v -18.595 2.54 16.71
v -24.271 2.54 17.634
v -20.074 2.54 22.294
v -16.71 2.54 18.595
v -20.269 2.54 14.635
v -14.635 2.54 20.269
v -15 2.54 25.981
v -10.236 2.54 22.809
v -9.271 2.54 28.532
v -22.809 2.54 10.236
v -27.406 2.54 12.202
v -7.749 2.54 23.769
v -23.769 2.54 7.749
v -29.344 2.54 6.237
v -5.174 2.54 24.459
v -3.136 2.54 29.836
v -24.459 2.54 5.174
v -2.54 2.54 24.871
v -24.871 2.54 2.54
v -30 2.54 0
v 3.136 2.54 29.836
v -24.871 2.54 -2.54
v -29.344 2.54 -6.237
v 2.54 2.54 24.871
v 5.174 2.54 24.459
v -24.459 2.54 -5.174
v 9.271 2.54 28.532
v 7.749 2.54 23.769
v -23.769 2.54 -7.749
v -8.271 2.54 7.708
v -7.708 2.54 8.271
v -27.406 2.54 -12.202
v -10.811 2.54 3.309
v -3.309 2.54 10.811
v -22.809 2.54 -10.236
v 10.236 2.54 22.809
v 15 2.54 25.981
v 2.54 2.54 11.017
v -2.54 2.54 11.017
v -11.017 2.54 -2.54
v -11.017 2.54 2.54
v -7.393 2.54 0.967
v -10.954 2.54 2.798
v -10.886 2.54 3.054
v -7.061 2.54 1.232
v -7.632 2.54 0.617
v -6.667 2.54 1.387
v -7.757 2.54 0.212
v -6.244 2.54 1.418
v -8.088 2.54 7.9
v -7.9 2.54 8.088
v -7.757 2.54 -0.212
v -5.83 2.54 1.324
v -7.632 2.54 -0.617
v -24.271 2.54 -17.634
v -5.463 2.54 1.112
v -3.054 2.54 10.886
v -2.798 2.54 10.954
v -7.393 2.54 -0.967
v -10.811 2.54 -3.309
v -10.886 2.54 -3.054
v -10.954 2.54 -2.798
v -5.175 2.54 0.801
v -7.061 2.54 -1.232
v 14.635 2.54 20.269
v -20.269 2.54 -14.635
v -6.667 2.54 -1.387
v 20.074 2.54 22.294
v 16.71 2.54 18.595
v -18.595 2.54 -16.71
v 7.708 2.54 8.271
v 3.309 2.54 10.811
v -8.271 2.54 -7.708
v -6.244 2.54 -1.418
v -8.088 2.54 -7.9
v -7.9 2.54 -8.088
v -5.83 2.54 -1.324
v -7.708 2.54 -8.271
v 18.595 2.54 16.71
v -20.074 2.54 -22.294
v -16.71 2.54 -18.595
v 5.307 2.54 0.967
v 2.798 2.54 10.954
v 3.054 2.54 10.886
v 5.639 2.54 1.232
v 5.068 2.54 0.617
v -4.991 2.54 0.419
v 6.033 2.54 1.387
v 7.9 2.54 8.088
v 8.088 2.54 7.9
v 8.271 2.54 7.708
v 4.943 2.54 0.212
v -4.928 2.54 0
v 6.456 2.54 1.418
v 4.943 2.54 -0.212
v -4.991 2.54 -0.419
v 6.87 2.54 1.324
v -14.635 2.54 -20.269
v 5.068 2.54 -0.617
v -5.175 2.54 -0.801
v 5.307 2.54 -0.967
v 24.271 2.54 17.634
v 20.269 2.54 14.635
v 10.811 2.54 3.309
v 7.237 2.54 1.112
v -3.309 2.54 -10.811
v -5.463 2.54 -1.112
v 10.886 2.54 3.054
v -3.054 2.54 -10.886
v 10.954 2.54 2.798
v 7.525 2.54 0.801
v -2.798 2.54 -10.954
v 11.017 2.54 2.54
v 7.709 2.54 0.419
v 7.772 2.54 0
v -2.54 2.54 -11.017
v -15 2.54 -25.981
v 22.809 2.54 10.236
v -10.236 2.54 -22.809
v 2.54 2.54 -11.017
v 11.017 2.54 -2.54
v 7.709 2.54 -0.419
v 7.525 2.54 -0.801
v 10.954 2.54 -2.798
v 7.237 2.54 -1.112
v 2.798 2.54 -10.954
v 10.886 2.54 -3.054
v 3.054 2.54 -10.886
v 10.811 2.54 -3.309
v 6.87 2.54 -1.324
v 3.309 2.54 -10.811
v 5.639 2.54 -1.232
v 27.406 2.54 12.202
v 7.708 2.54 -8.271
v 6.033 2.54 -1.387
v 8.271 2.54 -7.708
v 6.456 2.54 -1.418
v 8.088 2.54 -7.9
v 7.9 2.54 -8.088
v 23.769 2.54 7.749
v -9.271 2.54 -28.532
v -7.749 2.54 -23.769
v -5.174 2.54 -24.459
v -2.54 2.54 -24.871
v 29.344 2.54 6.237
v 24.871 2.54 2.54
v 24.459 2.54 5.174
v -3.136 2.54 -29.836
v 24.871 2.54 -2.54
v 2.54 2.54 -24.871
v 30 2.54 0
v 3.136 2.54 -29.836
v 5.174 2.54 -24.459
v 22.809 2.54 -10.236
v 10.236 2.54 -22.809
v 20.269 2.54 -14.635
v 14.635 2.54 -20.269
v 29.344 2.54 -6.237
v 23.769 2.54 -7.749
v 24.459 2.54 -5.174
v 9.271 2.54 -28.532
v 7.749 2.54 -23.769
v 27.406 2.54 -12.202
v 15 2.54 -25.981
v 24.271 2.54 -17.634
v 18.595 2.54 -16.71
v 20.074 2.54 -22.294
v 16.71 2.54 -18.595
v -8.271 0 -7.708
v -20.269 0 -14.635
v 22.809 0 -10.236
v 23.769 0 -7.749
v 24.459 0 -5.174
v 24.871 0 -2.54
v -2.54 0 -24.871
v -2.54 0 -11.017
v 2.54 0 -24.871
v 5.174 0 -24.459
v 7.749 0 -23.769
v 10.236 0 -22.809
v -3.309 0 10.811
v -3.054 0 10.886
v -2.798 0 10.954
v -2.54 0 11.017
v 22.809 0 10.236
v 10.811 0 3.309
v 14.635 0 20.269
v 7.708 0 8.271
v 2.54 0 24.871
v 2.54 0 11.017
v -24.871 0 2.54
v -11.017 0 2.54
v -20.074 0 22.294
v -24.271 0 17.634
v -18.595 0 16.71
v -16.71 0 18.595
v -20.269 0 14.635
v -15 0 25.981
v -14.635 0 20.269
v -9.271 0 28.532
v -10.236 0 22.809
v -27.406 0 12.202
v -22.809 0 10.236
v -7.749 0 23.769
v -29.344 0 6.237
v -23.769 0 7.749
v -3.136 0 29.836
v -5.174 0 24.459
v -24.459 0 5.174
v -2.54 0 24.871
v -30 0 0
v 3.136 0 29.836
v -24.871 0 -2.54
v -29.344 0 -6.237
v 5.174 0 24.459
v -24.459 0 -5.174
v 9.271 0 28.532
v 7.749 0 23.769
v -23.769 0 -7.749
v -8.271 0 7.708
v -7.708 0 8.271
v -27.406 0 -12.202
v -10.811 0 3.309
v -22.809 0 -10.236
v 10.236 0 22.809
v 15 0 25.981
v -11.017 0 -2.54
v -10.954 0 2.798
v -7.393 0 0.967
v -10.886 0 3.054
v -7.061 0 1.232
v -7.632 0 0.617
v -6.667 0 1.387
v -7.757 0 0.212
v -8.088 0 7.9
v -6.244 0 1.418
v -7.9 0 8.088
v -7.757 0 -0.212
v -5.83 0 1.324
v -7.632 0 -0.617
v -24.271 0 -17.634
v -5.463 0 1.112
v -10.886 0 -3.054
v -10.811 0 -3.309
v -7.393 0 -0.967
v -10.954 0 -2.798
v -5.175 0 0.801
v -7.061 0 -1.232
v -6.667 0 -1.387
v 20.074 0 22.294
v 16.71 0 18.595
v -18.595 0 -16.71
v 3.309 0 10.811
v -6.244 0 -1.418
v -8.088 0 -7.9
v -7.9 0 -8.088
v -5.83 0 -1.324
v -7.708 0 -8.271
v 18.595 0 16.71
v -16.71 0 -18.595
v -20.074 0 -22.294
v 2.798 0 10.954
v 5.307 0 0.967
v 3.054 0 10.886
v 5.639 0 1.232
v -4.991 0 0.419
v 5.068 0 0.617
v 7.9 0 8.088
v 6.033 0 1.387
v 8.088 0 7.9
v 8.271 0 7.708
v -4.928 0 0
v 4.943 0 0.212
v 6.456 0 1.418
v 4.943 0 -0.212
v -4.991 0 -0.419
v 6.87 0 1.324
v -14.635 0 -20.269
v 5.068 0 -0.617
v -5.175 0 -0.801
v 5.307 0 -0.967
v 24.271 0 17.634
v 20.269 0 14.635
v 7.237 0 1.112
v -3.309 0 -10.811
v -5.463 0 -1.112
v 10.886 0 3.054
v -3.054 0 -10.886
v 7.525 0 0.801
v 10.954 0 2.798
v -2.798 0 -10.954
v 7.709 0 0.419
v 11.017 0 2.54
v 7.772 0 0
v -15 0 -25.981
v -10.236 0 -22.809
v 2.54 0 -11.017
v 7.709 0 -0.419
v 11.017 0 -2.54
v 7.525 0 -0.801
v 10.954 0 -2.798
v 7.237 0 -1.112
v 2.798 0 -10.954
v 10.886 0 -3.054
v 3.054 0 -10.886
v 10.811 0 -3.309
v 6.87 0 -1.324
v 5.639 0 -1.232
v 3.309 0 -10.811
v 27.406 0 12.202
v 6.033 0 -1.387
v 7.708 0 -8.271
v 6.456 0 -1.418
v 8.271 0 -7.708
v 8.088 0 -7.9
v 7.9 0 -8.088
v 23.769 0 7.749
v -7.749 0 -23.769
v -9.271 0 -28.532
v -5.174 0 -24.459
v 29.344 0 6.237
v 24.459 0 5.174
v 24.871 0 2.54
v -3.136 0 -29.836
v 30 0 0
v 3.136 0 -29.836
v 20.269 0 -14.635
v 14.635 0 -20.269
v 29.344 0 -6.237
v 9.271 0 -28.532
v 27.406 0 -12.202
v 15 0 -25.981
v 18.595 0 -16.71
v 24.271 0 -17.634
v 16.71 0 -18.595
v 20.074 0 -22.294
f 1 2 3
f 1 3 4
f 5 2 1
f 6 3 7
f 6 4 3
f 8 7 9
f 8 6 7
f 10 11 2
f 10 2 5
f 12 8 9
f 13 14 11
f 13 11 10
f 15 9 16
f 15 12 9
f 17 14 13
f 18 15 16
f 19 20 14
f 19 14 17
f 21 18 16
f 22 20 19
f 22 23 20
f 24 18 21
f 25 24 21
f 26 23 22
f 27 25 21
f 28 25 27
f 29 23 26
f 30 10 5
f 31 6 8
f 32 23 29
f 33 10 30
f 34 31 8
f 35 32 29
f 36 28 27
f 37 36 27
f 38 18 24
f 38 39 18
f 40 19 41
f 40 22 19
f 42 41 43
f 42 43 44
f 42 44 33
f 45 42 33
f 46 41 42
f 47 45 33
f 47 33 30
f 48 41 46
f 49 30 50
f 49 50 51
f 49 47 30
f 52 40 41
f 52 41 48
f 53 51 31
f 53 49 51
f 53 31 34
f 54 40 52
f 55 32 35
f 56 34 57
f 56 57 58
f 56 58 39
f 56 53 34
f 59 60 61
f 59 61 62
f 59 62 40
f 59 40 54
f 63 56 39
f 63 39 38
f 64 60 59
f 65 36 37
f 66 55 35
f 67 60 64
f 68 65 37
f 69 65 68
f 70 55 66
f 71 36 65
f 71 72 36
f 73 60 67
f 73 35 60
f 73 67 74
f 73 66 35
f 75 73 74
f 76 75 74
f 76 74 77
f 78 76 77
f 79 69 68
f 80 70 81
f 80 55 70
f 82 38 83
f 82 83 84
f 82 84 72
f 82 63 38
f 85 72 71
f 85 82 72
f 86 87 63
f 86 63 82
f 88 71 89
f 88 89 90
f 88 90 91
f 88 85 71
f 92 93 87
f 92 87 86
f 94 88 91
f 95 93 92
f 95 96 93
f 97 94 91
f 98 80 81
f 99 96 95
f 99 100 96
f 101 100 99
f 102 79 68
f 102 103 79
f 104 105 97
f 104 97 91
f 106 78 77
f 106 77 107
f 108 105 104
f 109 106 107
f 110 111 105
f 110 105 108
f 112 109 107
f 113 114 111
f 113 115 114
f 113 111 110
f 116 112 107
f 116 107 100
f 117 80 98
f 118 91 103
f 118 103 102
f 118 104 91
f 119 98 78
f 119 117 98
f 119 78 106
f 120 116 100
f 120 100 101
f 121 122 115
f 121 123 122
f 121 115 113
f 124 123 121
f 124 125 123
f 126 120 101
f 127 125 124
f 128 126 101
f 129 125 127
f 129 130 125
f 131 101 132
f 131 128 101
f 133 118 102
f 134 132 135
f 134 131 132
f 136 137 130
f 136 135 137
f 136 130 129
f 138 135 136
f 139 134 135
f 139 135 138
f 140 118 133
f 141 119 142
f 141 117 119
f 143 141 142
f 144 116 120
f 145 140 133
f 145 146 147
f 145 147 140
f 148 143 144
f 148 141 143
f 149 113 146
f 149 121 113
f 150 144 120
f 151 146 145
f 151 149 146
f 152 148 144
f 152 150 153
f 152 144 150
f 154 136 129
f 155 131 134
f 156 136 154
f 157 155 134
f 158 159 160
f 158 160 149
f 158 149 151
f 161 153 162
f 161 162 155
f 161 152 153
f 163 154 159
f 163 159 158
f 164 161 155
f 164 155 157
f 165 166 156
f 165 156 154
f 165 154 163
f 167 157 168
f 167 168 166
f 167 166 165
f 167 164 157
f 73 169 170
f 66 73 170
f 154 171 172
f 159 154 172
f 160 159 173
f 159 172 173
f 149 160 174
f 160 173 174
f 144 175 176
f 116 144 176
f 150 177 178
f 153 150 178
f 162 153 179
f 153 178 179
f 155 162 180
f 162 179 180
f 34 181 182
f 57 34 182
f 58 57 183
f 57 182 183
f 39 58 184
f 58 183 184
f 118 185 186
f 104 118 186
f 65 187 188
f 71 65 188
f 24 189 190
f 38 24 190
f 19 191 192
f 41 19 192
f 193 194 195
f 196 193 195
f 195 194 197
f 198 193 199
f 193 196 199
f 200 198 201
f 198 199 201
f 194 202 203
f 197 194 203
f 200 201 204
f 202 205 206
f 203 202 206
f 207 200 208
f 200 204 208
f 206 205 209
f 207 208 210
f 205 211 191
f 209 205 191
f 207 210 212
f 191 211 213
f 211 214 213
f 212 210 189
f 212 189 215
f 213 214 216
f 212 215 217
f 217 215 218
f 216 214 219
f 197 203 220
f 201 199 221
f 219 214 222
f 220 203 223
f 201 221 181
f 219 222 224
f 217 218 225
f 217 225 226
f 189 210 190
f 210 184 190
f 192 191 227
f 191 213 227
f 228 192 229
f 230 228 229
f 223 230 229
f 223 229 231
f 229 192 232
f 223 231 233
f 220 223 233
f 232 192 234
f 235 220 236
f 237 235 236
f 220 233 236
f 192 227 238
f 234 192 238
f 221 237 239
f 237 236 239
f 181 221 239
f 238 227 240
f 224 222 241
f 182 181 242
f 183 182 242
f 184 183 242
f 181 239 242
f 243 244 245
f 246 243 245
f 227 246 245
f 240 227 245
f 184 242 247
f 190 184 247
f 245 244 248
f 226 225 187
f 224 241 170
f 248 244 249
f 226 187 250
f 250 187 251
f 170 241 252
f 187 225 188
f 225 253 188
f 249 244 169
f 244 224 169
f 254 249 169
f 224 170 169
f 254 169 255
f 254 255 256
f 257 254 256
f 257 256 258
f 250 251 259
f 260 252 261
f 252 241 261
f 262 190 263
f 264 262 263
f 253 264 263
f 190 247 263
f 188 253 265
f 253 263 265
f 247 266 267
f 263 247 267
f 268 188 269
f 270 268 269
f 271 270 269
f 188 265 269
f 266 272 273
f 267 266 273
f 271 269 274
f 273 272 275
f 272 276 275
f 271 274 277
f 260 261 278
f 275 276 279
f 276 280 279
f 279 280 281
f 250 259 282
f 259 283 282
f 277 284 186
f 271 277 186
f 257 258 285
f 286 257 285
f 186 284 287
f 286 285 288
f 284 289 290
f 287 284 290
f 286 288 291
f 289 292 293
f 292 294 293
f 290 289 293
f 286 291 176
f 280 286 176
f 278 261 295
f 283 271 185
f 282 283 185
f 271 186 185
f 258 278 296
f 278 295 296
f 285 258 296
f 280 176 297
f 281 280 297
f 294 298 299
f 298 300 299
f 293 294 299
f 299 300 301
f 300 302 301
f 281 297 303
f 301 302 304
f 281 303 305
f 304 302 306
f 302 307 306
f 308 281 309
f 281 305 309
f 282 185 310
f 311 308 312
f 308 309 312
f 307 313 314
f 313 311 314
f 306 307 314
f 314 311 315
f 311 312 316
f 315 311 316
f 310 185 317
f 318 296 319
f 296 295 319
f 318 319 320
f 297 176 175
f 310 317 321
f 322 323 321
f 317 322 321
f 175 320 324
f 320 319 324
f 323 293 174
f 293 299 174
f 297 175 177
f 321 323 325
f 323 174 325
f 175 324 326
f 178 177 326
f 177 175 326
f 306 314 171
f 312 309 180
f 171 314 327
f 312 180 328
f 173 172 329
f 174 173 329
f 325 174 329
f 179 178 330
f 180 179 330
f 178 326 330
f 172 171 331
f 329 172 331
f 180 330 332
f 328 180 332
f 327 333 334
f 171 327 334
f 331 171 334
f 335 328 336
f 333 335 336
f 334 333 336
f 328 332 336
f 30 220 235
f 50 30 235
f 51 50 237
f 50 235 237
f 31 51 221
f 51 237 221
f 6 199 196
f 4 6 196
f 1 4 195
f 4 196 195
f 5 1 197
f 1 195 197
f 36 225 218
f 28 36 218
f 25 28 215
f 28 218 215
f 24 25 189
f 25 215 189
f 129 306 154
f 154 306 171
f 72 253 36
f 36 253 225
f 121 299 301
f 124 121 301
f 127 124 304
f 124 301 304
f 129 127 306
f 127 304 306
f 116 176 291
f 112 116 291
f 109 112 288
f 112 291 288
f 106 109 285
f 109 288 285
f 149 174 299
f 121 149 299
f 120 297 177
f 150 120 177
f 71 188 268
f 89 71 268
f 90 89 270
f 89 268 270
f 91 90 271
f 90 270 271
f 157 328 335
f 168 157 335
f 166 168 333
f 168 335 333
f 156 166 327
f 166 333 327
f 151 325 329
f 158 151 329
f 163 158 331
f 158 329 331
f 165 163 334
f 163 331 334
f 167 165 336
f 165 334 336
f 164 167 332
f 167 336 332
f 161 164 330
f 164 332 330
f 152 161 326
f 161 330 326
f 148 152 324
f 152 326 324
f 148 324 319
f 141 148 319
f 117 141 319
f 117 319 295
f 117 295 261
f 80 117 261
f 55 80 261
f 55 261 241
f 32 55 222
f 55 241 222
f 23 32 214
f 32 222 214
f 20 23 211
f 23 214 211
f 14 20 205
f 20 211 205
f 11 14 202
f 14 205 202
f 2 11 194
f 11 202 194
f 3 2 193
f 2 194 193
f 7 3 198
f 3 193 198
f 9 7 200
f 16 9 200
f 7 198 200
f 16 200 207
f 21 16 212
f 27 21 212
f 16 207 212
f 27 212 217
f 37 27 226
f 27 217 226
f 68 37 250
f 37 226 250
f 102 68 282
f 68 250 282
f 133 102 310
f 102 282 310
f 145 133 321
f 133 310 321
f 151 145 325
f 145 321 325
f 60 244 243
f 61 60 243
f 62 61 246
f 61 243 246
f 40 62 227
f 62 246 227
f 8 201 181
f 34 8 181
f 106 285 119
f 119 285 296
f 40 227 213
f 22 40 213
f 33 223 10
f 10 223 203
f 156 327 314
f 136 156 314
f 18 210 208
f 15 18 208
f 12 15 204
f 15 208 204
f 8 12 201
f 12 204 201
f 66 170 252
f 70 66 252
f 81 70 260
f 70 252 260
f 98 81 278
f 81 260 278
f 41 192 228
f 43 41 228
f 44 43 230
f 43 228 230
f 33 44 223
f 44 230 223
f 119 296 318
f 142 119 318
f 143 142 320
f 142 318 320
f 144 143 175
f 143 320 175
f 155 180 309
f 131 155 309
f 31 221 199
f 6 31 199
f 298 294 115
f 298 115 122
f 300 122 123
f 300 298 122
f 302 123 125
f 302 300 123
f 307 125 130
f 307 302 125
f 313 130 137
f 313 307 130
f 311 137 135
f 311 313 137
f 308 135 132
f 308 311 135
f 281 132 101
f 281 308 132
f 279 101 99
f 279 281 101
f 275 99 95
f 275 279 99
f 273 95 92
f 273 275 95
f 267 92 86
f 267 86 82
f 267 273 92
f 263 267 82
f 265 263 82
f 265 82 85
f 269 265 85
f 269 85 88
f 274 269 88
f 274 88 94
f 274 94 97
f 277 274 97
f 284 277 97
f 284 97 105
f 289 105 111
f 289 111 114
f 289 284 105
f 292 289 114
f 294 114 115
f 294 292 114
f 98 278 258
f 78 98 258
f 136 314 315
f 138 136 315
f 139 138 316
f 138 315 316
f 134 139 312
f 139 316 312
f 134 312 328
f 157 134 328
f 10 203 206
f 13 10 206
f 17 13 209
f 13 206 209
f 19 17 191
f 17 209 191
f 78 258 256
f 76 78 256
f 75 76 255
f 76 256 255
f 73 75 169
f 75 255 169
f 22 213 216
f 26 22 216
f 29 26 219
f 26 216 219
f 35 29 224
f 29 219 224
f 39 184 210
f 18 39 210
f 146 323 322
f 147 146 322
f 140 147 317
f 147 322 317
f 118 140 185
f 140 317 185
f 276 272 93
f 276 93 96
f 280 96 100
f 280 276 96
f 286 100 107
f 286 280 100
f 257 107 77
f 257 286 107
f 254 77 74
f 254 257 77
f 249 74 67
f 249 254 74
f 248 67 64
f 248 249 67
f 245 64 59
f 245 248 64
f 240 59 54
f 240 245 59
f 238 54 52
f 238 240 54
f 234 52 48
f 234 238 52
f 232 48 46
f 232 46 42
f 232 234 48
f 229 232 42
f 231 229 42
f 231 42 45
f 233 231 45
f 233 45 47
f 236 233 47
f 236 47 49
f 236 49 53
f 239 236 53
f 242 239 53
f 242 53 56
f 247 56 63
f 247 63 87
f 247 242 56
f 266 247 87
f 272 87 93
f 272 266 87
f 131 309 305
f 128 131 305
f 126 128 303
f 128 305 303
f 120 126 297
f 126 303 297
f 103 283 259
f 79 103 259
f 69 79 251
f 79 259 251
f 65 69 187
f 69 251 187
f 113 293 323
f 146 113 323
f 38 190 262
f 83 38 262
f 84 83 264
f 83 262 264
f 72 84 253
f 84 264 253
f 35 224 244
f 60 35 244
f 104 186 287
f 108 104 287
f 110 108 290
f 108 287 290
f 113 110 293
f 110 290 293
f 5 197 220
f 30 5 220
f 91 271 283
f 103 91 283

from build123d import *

# Parameters (mm, degrees)
SKETCH1_R           = 30
SKETCH1_R_2         = 1.4224
BOSS_EXTRUDE1_DEPTH = 2.54


with BuildPart() as part:
    # Sketch1 → Boss-Extrude1 (new body)
    with BuildSketch(Plane(origin=(0, 0, 0), x_dir=(1, 0, 0), z_dir=(0, 1, 0))):
        Circle(SKETCH1_R)
        with BuildLine():
            ThreePointArc((3.308860999, 10.811115366), (2.926244071, 10.920891548), (2.54, 11.01713105))
            Line((2.54, 11.01713105), (2.54, 24.870633323))
            ThreePointArc((2.54, 24.870633323), (6.470476137, 24.148145694), (10.235612136, 22.808600266))
            Line((10.235612136, 22.808600266), (3.308860999, 10.811115366))
        make_face(mode=Mode.SUBTRACT)
        with BuildLine():
            ThreePointArc((8.271115366, 7.708270051), (7.994647477, 7.994647477), (7.708270051, 8.271115366))
            Line((7.708270051, 8.271115366), (14.635021187, 20.268600266))
            ThreePointArc((14.635021187, 20.268600266), (17.677669557, 17.677669557), (20.268600266, 14.635021187))
            Line((20.268600266, 14.635021187), (8.271115366, 7.708270051))
        make_face(mode=Mode.SUBTRACT)
        with BuildLine():
            ThreePointArc((11.01713105, 2.54), (10.920891548, 2.926244071), (10.811115366, 3.308860999))
            Line((10.811115366, 3.308860999), (22.808600266, 10.235612136))
            ThreePointArc((22.808600266, 10.235612136), (24.148145694, 6.470476137), (24.870633323, 2.54))
            Line((24.870633323, 2.54), (11.01713105, 2.54))
        make_face(mode=Mode.SUBTRACT)
        with BuildLine():
            ThreePointArc((10.811115366, -3.308860999), (10.920891548, -2.926244071), (11.01713105, -2.54))
            Line((11.01713105, -2.54), (24.870633323, -2.54))
            ThreePointArc((24.870633323, -2.54), (24.148145694, -6.470476137), (22.808600266, -10.235612136))
            Line((22.808600266, -10.235612136), (10.811115366, -3.308860999))
        make_face(mode=Mode.SUBTRACT)
        with BuildLine():
            ThreePointArc((7.708270051, -8.271115366), (7.994647477, -7.994647477), (8.271115366, -7.708270051))
            Line((8.271115366, -7.708270051), (20.268600266, -14.635021187))
            ThreePointArc((20.268600266, -14.635021187), (17.677669557, -17.677669557), (14.635021187, -20.268600266))
            Line((14.635021187, -20.268600266), (7.708270051, -8.271115366))
        make_face(mode=Mode.SUBTRACT)
        with BuildLine():
            ThreePointArc((2.54, -11.01713105), (2.926244071, -10.920891548), (3.308860999, -10.811115366))
            Line((3.308860999, -10.811115366), (10.235612136, -22.808600266))
            ThreePointArc((10.235612136, -22.808600266), (6.470476137, -24.148145694), (2.54, -24.870633323))
            Line((2.54, -24.870633323), (2.54, -11.01713105))
        make_face(mode=Mode.SUBTRACT)
        with BuildLine():
            ThreePointArc((-3.308860999, -10.811115366), (-2.926244071, -10.920891548), (-2.54, -11.01713105))
            Line((-2.54, -11.01713105), (-2.54, -24.870633323))
            ThreePointArc((-2.54, -24.870633323), (-6.470476137, -24.148145694), (-10.235612136, -22.808600266))
            Line((-10.235612136, -22.808600266), (-3.308860999, -10.811115366))
        make_face(mode=Mode.SUBTRACT)
        with BuildLine():
            ThreePointArc((-8.271115366, -7.708270051), (-7.994647477, -7.994647477), (-7.708270051, -8.271115366))
            Line((-7.708270051, -8.271115366), (-14.635021187, -20.268600266))
            ThreePointArc((-14.635021187, -20.268600266), (-17.677669557, -17.677669557), (-20.268600266, -14.635021187))
            Line((-20.268600266, -14.635021187), (-8.271115366, -7.708270051))
        make_face(mode=Mode.SUBTRACT)
        with BuildLine():
            ThreePointArc((-11.01713105, -2.54), (-10.920891548, -2.926244071), (-10.811115366, -3.308860999))
            Line((-10.811115366, -3.308860999), (-22.808600266, -10.235612136))
            ThreePointArc((-22.808600266, -10.235612136), (-24.148145694, -6.470476137), (-24.870633323, -2.54))
            Line((-24.870633323, -2.54), (-11.01713105, -2.54))
        make_face(mode=Mode.SUBTRACT)
        with BuildLine():
            ThreePointArc((-10.811115366, 3.308860999), (-10.920891548, 2.926244071), (-11.01713105, 2.54))
            Line((-11.01713105, 2.54), (-24.870633323, 2.54))
            ThreePointArc((-24.870633323, 2.54), (-24.148145694, 6.470476137), (-22.808600266, 10.235612136))
            Line((-22.808600266, 10.235612136), (-10.811115366, 3.308860999))
        make_face(mode=Mode.SUBTRACT)
        with BuildLine():
            ThreePointArc((-7.708270051, 8.271115366), (-7.994647477, 7.994647477), (-8.271115366, 7.708270051))
            Line((-8.271115366, 7.708270051), (-20.268600266, 14.635021187))
            ThreePointArc((-20.268600266, 14.635021187), (-17.677669557, 17.677669557), (-14.635021187, 20.268600266))
            Line((-14.635021187, 20.268600266), (-7.708270051, 8.271115366))
        make_face(mode=Mode.SUBTRACT)
        with BuildLine():
            ThreePointArc((-2.54, 11.01713105), (-2.926244071, 10.920891548), (-3.308860999, 10.811115366))
            Line((-3.308860999, 10.811115366), (-10.235612136, 22.808600266))
            ThreePointArc((-10.235612136, 22.808600266), (-6.470476137, 24.148145694), (-2.54, 24.870633323))
            Line((-2.54, 24.870633323), (-2.54, 11.01713105))
        make_face(mode=Mode.SUBTRACT)
        with Locations((-6.35, 0)):
            Circle(SKETCH1_R_2, mode=Mode.SUBTRACT)
        with Locations((6.35, 0)):
            Circle(SKETCH1_R_2, mode=Mode.SUBTRACT)
    extrude(amount=BOSS_EXTRUDE1_DEPTH)


solid = part.part
